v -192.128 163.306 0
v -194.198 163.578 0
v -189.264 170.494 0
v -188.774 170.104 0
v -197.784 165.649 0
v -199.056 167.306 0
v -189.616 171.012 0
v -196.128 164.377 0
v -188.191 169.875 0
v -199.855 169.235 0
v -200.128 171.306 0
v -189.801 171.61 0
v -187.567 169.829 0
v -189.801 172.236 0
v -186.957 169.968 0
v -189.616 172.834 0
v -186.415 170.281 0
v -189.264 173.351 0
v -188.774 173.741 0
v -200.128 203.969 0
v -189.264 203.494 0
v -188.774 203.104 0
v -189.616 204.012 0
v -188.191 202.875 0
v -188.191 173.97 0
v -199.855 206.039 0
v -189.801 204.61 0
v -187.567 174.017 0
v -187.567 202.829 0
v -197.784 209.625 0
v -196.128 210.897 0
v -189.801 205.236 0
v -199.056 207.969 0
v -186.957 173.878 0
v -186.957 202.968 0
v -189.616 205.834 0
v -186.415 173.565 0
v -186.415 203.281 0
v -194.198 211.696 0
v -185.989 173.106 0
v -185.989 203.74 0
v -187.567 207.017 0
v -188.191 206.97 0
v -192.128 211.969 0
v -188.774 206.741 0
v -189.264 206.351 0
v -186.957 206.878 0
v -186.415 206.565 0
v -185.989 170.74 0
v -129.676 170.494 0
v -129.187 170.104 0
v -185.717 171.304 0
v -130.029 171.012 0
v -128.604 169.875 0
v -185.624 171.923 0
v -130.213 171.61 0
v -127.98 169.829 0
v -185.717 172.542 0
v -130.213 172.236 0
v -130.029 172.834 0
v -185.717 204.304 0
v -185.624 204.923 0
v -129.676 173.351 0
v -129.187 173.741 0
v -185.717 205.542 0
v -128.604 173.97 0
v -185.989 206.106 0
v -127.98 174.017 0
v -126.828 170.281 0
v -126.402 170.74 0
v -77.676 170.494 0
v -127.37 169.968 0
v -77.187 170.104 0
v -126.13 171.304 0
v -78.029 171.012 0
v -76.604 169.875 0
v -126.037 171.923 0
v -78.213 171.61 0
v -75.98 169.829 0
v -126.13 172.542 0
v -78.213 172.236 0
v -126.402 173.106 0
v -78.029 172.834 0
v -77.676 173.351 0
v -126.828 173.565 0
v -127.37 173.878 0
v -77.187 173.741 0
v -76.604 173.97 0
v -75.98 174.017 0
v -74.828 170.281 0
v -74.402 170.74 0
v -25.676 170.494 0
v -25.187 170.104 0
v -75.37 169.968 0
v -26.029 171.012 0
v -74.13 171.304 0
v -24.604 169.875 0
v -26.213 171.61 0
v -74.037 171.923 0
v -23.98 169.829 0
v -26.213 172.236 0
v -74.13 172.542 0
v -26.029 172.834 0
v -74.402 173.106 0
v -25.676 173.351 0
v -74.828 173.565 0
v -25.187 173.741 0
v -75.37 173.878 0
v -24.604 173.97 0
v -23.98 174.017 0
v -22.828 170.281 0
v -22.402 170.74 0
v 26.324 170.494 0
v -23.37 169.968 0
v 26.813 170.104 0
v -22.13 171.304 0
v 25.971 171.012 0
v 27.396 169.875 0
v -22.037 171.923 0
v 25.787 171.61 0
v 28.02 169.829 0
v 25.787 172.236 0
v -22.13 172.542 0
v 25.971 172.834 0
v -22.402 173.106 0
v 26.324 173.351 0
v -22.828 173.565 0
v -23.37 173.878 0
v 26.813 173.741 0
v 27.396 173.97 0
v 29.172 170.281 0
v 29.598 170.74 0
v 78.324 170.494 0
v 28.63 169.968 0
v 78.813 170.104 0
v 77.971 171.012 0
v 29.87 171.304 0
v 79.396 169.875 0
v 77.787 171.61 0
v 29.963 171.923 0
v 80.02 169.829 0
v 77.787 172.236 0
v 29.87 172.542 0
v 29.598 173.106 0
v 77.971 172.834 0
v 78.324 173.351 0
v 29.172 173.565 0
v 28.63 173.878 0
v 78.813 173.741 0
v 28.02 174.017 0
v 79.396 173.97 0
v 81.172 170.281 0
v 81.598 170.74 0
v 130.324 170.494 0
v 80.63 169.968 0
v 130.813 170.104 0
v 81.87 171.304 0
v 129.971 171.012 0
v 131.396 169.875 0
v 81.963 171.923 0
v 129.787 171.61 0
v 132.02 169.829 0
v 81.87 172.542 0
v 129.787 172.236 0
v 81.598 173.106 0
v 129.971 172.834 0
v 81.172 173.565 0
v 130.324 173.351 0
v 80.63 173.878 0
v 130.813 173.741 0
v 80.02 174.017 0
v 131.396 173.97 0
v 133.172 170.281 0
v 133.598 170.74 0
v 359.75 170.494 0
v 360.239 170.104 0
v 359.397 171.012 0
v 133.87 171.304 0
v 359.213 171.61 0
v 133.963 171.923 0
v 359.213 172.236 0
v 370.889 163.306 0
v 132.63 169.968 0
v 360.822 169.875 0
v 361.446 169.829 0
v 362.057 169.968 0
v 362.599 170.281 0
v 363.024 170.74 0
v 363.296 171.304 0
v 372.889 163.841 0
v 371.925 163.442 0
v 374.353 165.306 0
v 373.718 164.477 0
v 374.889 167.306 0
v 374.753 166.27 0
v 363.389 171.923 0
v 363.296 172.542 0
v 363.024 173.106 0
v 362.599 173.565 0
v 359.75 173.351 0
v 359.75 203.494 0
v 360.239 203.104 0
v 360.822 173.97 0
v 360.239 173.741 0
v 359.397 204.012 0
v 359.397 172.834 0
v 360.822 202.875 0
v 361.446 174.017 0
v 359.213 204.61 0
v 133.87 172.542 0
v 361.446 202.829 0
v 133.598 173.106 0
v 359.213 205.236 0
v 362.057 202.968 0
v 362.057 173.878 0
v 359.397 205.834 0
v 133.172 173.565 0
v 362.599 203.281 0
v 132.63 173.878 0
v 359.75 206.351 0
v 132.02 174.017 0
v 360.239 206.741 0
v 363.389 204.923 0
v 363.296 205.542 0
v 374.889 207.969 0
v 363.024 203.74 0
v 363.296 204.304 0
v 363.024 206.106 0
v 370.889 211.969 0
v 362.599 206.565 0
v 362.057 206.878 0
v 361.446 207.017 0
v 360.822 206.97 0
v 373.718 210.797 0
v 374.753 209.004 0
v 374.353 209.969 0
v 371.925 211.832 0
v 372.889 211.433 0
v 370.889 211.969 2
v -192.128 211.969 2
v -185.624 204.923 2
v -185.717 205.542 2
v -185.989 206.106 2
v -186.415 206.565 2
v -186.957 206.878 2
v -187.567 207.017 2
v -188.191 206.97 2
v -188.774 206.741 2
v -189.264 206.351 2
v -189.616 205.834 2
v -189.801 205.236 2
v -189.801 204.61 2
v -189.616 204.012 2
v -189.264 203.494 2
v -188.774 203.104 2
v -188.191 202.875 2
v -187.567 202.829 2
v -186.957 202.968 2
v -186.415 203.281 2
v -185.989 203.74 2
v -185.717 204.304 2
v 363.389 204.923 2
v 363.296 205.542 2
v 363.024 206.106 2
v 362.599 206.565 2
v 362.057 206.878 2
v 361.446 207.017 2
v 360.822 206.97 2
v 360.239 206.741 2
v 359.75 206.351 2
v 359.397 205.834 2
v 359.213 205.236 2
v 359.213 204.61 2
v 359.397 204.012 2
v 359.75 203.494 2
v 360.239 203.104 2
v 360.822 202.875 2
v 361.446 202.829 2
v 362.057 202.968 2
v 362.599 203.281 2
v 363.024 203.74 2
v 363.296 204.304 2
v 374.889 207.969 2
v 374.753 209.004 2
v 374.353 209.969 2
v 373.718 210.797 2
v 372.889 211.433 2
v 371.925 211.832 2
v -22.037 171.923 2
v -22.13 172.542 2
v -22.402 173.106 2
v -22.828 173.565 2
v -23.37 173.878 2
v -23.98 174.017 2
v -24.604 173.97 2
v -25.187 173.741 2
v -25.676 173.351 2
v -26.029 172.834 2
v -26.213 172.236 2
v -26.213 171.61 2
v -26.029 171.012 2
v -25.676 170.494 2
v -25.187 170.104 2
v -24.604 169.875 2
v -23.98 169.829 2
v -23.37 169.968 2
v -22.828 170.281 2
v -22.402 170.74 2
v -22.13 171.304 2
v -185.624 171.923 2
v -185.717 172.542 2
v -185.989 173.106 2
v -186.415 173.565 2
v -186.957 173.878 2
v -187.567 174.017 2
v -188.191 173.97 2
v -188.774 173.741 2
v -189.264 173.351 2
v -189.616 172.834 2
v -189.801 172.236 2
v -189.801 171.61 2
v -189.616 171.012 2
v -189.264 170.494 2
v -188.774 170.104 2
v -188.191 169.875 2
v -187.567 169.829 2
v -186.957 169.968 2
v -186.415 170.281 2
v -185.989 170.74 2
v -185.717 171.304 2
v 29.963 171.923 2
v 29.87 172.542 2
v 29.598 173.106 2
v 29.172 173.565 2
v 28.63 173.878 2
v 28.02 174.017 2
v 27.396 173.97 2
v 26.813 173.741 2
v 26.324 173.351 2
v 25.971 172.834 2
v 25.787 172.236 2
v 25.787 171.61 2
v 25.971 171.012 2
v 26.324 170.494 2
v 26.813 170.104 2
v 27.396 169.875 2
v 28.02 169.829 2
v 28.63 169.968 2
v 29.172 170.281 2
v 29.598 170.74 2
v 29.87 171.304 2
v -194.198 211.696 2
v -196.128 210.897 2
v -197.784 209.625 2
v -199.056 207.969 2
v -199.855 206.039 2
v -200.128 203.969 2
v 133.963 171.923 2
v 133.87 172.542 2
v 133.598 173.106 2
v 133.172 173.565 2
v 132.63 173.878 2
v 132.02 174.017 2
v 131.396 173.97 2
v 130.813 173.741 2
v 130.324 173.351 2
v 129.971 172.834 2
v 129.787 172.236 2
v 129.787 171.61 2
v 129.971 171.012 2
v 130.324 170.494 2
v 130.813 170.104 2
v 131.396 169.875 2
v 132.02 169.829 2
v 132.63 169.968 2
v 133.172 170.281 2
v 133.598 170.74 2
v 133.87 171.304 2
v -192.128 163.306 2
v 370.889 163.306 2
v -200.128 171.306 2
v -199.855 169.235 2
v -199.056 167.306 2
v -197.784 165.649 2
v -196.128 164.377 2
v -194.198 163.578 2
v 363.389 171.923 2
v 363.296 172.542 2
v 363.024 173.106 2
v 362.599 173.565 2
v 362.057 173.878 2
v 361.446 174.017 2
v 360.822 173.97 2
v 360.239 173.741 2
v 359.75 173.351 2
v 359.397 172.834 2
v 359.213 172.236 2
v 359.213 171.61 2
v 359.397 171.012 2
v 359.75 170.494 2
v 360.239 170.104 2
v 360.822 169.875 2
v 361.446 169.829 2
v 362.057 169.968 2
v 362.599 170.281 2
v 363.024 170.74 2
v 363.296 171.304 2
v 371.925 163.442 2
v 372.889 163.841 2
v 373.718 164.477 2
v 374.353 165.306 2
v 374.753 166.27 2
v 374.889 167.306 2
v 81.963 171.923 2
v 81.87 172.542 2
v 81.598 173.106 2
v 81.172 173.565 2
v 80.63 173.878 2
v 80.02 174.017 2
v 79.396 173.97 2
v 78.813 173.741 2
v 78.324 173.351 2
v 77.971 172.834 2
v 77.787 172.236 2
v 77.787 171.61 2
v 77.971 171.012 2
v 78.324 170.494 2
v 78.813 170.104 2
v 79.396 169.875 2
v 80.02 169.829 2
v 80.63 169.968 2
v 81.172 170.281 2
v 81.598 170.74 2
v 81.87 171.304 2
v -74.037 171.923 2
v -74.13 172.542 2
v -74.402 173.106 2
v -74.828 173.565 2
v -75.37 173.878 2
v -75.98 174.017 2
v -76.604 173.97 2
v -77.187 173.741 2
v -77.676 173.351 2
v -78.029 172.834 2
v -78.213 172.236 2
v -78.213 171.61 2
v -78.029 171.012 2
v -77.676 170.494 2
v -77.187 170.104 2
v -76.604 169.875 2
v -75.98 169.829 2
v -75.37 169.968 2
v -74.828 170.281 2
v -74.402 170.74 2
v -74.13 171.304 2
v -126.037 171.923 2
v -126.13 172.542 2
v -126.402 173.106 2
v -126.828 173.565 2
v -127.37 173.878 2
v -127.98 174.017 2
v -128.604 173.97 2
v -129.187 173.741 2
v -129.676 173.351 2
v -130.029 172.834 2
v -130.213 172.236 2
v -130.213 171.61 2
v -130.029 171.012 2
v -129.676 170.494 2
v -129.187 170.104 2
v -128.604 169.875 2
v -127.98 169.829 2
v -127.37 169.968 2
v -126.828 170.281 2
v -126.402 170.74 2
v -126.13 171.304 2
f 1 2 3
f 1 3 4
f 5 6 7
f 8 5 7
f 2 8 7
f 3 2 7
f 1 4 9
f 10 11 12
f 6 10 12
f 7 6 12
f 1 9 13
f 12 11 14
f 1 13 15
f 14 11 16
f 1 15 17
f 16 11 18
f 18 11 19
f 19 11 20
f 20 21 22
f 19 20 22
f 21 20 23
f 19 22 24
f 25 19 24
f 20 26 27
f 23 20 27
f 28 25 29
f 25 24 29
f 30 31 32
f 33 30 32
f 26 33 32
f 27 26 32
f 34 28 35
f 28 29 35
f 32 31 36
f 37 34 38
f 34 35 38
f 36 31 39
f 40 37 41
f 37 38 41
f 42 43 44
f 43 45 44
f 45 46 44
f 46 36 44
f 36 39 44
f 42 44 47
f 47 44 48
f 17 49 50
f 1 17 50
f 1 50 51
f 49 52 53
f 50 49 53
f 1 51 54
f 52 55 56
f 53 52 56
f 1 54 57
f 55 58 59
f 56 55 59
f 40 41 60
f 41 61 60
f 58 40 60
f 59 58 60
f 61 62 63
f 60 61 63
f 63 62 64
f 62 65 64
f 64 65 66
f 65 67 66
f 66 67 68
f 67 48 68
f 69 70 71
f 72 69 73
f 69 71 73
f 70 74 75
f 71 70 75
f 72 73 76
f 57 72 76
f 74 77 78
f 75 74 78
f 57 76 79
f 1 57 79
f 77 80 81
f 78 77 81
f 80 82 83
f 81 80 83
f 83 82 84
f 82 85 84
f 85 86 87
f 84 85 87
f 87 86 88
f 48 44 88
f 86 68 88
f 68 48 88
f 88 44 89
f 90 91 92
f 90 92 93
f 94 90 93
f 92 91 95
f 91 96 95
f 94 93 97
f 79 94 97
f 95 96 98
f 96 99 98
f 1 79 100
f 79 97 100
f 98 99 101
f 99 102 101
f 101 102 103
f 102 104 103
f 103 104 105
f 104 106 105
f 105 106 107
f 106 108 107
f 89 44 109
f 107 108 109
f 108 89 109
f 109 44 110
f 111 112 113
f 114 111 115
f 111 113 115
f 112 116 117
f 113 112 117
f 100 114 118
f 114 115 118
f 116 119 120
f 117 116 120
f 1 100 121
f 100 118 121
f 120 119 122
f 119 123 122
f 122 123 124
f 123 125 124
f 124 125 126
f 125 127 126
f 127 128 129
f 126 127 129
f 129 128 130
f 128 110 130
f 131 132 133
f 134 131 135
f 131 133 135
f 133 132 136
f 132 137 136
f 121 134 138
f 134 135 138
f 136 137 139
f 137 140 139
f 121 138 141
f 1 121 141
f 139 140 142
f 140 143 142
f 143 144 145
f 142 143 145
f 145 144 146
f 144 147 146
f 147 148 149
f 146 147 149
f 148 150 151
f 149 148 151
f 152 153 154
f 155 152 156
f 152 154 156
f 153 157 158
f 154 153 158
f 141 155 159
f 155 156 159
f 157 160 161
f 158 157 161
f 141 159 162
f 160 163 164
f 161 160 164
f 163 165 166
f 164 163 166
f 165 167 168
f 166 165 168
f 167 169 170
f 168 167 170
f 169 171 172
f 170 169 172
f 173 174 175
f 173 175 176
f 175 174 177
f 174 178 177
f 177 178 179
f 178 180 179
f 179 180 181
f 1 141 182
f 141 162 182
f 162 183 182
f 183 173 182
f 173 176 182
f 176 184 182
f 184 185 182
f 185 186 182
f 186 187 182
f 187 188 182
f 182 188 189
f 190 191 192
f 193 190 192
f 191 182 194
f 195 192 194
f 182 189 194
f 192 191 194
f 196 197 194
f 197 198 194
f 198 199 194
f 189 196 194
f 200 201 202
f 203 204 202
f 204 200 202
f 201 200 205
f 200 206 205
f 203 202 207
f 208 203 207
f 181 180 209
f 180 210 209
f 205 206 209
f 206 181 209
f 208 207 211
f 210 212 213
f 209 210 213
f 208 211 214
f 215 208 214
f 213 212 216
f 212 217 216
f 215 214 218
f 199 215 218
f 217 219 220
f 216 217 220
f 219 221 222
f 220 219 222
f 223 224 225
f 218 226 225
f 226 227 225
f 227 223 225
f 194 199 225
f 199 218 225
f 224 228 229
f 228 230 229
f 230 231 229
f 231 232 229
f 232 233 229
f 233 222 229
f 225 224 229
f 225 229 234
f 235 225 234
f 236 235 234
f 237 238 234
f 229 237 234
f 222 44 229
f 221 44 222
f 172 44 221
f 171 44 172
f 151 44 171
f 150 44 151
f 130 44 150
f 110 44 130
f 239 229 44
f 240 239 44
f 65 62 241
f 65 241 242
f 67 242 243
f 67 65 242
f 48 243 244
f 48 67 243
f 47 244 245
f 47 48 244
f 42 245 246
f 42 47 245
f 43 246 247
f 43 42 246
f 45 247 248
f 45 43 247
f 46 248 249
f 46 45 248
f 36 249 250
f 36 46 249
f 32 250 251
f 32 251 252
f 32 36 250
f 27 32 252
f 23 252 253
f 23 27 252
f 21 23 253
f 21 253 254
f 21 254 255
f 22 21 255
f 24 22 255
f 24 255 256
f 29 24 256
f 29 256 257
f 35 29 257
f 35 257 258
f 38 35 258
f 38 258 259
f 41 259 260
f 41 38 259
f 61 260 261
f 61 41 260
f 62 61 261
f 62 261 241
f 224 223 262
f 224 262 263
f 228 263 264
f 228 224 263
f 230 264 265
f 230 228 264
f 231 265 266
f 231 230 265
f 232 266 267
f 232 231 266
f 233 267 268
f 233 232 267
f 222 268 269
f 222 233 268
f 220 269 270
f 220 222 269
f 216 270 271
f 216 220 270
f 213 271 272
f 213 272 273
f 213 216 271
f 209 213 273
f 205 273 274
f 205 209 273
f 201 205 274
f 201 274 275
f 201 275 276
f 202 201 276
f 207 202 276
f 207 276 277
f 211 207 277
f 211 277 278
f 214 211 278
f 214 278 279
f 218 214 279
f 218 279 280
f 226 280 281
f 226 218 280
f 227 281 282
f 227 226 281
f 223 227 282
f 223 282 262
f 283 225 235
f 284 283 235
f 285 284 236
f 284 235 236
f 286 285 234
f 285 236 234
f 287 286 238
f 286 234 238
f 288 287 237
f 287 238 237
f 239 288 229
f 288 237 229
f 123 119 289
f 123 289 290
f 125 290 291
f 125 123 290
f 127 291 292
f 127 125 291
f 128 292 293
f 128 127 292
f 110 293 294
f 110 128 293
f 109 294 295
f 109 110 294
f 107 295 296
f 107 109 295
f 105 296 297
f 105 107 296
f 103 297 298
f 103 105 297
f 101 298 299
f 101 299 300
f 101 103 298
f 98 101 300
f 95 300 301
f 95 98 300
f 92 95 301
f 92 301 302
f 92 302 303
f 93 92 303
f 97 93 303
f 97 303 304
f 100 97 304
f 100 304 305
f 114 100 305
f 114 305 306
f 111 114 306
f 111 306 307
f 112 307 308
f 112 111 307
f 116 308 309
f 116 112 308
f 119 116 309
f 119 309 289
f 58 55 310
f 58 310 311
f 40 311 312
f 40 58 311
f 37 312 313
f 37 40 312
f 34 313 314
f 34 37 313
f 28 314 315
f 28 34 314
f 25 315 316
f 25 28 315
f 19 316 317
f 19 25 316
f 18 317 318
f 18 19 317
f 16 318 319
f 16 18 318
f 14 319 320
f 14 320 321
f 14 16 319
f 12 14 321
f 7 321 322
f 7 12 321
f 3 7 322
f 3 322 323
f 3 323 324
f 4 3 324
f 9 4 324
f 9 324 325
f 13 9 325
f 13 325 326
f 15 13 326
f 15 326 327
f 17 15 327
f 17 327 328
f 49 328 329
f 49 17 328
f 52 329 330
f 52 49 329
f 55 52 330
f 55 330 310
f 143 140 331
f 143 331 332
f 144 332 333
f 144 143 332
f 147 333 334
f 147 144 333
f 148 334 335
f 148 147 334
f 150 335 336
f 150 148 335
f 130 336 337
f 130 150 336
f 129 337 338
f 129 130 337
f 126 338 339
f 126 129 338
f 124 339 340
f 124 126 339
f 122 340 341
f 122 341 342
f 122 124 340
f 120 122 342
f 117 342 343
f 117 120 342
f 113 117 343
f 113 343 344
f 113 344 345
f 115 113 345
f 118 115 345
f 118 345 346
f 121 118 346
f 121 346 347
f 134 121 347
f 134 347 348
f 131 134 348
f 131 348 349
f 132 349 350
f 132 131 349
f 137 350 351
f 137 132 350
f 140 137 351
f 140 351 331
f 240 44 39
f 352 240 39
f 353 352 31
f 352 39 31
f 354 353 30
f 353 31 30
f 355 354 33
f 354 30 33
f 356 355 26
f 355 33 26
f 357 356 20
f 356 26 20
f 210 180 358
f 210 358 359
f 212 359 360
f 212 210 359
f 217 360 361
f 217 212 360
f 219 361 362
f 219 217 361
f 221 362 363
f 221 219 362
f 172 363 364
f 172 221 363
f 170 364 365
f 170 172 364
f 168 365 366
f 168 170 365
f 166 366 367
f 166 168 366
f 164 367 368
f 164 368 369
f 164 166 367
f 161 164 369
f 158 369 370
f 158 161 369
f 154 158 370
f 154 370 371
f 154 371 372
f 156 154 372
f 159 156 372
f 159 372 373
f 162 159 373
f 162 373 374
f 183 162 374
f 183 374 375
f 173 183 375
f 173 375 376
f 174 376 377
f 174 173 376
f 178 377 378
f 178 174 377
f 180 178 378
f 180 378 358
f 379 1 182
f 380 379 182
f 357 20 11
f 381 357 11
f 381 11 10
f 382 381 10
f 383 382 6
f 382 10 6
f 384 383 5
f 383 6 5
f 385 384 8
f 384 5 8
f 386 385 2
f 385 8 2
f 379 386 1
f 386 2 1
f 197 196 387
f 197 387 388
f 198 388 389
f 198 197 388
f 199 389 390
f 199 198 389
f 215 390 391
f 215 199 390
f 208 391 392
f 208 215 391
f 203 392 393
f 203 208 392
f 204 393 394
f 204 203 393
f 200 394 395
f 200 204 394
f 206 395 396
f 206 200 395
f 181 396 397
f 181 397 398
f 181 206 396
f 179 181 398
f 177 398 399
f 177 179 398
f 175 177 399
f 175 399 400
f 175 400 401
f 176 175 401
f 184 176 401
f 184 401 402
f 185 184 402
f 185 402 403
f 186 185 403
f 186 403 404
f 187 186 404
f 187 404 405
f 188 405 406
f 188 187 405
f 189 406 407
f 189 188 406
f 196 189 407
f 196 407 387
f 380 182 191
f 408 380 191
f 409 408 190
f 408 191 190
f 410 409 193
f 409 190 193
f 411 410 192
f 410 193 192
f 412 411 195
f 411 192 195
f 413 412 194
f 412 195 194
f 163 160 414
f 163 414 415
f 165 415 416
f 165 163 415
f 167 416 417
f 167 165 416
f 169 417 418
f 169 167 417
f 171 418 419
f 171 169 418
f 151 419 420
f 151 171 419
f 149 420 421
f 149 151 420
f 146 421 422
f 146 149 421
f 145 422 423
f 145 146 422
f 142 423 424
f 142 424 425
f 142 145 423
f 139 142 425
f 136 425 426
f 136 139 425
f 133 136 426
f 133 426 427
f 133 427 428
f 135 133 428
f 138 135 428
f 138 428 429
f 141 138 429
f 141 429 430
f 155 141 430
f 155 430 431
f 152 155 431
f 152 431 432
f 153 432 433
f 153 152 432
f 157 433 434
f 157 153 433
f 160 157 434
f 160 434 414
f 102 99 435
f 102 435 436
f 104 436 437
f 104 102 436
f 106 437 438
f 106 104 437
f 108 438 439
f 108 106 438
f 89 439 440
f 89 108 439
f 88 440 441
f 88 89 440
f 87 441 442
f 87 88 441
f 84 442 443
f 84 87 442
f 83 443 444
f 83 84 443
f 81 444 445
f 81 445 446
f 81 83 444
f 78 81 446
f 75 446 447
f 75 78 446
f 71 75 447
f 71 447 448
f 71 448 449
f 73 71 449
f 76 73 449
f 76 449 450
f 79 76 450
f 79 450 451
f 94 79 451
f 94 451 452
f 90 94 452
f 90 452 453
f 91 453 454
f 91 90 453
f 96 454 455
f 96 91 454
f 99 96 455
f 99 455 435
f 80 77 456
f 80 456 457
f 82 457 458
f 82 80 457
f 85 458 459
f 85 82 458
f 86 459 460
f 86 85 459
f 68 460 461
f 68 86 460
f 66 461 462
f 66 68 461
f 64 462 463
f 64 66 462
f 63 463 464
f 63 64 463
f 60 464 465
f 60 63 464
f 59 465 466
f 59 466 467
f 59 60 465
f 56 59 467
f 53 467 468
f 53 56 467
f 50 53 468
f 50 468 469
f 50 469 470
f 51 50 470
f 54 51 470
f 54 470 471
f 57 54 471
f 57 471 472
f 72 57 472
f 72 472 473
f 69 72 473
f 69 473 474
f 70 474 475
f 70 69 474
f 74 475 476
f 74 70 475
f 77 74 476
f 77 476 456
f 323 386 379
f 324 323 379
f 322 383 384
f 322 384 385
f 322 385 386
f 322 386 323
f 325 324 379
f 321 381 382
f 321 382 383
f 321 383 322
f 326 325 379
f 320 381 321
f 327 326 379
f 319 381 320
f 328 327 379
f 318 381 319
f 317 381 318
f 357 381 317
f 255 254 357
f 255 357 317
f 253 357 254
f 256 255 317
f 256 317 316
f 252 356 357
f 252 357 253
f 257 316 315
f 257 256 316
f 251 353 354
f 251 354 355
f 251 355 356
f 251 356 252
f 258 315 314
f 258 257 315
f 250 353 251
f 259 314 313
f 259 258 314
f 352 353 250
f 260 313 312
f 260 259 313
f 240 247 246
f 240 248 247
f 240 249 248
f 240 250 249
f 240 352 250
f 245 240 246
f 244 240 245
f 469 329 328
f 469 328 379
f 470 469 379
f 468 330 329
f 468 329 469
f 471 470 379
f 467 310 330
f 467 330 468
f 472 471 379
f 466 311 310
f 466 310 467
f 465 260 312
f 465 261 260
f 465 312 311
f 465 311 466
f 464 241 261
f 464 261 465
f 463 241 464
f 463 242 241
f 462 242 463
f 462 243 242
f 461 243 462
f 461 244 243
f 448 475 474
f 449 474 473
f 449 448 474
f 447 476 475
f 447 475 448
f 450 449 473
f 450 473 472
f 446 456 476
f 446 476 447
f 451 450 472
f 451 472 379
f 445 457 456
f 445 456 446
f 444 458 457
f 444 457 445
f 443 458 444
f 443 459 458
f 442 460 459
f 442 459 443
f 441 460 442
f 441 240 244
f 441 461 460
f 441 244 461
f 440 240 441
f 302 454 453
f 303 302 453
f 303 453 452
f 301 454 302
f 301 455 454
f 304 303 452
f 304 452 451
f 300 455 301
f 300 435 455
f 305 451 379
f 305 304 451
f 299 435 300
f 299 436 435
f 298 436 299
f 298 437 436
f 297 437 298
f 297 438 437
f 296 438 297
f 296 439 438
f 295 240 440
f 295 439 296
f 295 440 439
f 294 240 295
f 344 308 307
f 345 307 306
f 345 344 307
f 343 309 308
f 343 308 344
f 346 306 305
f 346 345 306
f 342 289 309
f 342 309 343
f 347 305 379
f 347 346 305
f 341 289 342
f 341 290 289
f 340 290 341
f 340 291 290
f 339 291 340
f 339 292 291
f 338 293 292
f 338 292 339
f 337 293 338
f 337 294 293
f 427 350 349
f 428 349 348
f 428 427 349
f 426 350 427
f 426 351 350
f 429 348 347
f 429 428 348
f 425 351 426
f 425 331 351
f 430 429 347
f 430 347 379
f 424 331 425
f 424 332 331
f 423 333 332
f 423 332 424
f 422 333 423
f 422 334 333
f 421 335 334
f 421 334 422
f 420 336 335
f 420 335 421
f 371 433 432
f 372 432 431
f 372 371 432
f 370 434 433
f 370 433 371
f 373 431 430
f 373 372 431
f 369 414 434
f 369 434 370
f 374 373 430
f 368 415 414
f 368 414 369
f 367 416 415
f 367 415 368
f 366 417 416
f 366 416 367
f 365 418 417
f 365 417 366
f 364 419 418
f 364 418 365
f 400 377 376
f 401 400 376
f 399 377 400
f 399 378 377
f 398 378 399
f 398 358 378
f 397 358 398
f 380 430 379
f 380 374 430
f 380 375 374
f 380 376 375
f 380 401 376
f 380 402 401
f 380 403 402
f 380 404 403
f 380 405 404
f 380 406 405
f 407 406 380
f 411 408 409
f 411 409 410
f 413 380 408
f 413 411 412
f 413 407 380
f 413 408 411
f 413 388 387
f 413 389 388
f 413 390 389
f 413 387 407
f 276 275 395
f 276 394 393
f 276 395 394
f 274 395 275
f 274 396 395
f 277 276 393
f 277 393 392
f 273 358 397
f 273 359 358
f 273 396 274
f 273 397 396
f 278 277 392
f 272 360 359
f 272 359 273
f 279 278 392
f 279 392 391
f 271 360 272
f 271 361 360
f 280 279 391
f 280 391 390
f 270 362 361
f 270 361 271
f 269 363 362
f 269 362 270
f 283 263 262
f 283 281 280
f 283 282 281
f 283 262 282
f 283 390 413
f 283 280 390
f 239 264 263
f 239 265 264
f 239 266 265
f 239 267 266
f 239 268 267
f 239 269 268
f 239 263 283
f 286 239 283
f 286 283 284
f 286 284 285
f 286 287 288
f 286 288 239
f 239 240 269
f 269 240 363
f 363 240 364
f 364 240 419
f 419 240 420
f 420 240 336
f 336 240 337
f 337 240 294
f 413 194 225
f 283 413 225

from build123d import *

# Parameters (mm, degrees)
MODEL_R            = 2.1
BOSS_EXTRU_1_DEPTH = 2


with BuildPart() as part:
    # Model → Boss.-Extru.1 (new body)
    with BuildSketch(Plane.XY):
        with BuildLine():
            Line((370.889379555, 211.968513878), (-192.127528462, 211.968513878))
            ThreePointArc((-192.127528462, 211.968513878), (-197.784382711, 209.625368128), (-200.127528462, 203.968513878))
            Line((-200.127528462, 203.968513878), (-200.127528462, 171.305548092))
            ThreePointArc((-200.127528462, 171.305548092), (-197.784382711, 165.648693842), (-192.127528462, 163.305548092))
            Line((-192.127528462, 163.305548092), (370.889379555, 163.305548092))
            ThreePointArc((370.889379555, 163.305548092), (373.71780668, 164.477120967), (374.889379555, 167.305548092))
            Line((374.889379555, 167.305548092), (374.889379555, 207.968513878))
            ThreePointArc((374.889379555, 207.968513878), (373.71780668, 210.796941003), (370.889379555, 211.968513878))
        make_face()
        with Locations((361.289379555, 204.922740721)):
            Circle(MODEL_R, mode=Mode.SUBTRACT)
        with Locations((-187.724187677, 204.922740721)):
            Circle(MODEL_R, mode=Mode.SUBTRACT)
        with Locations((-76.136887709, 171.922740721)):
            Circle(MODEL_R, mode=Mode.SUBTRACT)
        with Locations((-24.136887709, 171.922740721)):
            Circle(MODEL_R, mode=Mode.SUBTRACT)
        with Locations((-128.136887709, 171.922740721)):
            Circle(MODEL_R, mode=Mode.SUBTRACT)
        with Locations((131.863112291, 171.922740721)):
            Circle(MODEL_R, mode=Mode.SUBTRACT)
        with Locations((79.863112291, 171.922740721)):
            Circle(MODEL_R, mode=Mode.SUBTRACT)
        with Locations((27.863112291, 171.922740721)):
            Circle(MODEL_R, mode=Mode.SUBTRACT)
        with Locations((361.289379555, 171.922740721)):
            Circle(MODEL_R, mode=Mode.SUBTRACT)
        with Locations((-187.724187677, 171.922740721)):
            Circle(MODEL_R, mode=Mode.SUBTRACT)
    extrude(amount=BOSS_EXTRU_1_DEPTH)


solid = part.part
